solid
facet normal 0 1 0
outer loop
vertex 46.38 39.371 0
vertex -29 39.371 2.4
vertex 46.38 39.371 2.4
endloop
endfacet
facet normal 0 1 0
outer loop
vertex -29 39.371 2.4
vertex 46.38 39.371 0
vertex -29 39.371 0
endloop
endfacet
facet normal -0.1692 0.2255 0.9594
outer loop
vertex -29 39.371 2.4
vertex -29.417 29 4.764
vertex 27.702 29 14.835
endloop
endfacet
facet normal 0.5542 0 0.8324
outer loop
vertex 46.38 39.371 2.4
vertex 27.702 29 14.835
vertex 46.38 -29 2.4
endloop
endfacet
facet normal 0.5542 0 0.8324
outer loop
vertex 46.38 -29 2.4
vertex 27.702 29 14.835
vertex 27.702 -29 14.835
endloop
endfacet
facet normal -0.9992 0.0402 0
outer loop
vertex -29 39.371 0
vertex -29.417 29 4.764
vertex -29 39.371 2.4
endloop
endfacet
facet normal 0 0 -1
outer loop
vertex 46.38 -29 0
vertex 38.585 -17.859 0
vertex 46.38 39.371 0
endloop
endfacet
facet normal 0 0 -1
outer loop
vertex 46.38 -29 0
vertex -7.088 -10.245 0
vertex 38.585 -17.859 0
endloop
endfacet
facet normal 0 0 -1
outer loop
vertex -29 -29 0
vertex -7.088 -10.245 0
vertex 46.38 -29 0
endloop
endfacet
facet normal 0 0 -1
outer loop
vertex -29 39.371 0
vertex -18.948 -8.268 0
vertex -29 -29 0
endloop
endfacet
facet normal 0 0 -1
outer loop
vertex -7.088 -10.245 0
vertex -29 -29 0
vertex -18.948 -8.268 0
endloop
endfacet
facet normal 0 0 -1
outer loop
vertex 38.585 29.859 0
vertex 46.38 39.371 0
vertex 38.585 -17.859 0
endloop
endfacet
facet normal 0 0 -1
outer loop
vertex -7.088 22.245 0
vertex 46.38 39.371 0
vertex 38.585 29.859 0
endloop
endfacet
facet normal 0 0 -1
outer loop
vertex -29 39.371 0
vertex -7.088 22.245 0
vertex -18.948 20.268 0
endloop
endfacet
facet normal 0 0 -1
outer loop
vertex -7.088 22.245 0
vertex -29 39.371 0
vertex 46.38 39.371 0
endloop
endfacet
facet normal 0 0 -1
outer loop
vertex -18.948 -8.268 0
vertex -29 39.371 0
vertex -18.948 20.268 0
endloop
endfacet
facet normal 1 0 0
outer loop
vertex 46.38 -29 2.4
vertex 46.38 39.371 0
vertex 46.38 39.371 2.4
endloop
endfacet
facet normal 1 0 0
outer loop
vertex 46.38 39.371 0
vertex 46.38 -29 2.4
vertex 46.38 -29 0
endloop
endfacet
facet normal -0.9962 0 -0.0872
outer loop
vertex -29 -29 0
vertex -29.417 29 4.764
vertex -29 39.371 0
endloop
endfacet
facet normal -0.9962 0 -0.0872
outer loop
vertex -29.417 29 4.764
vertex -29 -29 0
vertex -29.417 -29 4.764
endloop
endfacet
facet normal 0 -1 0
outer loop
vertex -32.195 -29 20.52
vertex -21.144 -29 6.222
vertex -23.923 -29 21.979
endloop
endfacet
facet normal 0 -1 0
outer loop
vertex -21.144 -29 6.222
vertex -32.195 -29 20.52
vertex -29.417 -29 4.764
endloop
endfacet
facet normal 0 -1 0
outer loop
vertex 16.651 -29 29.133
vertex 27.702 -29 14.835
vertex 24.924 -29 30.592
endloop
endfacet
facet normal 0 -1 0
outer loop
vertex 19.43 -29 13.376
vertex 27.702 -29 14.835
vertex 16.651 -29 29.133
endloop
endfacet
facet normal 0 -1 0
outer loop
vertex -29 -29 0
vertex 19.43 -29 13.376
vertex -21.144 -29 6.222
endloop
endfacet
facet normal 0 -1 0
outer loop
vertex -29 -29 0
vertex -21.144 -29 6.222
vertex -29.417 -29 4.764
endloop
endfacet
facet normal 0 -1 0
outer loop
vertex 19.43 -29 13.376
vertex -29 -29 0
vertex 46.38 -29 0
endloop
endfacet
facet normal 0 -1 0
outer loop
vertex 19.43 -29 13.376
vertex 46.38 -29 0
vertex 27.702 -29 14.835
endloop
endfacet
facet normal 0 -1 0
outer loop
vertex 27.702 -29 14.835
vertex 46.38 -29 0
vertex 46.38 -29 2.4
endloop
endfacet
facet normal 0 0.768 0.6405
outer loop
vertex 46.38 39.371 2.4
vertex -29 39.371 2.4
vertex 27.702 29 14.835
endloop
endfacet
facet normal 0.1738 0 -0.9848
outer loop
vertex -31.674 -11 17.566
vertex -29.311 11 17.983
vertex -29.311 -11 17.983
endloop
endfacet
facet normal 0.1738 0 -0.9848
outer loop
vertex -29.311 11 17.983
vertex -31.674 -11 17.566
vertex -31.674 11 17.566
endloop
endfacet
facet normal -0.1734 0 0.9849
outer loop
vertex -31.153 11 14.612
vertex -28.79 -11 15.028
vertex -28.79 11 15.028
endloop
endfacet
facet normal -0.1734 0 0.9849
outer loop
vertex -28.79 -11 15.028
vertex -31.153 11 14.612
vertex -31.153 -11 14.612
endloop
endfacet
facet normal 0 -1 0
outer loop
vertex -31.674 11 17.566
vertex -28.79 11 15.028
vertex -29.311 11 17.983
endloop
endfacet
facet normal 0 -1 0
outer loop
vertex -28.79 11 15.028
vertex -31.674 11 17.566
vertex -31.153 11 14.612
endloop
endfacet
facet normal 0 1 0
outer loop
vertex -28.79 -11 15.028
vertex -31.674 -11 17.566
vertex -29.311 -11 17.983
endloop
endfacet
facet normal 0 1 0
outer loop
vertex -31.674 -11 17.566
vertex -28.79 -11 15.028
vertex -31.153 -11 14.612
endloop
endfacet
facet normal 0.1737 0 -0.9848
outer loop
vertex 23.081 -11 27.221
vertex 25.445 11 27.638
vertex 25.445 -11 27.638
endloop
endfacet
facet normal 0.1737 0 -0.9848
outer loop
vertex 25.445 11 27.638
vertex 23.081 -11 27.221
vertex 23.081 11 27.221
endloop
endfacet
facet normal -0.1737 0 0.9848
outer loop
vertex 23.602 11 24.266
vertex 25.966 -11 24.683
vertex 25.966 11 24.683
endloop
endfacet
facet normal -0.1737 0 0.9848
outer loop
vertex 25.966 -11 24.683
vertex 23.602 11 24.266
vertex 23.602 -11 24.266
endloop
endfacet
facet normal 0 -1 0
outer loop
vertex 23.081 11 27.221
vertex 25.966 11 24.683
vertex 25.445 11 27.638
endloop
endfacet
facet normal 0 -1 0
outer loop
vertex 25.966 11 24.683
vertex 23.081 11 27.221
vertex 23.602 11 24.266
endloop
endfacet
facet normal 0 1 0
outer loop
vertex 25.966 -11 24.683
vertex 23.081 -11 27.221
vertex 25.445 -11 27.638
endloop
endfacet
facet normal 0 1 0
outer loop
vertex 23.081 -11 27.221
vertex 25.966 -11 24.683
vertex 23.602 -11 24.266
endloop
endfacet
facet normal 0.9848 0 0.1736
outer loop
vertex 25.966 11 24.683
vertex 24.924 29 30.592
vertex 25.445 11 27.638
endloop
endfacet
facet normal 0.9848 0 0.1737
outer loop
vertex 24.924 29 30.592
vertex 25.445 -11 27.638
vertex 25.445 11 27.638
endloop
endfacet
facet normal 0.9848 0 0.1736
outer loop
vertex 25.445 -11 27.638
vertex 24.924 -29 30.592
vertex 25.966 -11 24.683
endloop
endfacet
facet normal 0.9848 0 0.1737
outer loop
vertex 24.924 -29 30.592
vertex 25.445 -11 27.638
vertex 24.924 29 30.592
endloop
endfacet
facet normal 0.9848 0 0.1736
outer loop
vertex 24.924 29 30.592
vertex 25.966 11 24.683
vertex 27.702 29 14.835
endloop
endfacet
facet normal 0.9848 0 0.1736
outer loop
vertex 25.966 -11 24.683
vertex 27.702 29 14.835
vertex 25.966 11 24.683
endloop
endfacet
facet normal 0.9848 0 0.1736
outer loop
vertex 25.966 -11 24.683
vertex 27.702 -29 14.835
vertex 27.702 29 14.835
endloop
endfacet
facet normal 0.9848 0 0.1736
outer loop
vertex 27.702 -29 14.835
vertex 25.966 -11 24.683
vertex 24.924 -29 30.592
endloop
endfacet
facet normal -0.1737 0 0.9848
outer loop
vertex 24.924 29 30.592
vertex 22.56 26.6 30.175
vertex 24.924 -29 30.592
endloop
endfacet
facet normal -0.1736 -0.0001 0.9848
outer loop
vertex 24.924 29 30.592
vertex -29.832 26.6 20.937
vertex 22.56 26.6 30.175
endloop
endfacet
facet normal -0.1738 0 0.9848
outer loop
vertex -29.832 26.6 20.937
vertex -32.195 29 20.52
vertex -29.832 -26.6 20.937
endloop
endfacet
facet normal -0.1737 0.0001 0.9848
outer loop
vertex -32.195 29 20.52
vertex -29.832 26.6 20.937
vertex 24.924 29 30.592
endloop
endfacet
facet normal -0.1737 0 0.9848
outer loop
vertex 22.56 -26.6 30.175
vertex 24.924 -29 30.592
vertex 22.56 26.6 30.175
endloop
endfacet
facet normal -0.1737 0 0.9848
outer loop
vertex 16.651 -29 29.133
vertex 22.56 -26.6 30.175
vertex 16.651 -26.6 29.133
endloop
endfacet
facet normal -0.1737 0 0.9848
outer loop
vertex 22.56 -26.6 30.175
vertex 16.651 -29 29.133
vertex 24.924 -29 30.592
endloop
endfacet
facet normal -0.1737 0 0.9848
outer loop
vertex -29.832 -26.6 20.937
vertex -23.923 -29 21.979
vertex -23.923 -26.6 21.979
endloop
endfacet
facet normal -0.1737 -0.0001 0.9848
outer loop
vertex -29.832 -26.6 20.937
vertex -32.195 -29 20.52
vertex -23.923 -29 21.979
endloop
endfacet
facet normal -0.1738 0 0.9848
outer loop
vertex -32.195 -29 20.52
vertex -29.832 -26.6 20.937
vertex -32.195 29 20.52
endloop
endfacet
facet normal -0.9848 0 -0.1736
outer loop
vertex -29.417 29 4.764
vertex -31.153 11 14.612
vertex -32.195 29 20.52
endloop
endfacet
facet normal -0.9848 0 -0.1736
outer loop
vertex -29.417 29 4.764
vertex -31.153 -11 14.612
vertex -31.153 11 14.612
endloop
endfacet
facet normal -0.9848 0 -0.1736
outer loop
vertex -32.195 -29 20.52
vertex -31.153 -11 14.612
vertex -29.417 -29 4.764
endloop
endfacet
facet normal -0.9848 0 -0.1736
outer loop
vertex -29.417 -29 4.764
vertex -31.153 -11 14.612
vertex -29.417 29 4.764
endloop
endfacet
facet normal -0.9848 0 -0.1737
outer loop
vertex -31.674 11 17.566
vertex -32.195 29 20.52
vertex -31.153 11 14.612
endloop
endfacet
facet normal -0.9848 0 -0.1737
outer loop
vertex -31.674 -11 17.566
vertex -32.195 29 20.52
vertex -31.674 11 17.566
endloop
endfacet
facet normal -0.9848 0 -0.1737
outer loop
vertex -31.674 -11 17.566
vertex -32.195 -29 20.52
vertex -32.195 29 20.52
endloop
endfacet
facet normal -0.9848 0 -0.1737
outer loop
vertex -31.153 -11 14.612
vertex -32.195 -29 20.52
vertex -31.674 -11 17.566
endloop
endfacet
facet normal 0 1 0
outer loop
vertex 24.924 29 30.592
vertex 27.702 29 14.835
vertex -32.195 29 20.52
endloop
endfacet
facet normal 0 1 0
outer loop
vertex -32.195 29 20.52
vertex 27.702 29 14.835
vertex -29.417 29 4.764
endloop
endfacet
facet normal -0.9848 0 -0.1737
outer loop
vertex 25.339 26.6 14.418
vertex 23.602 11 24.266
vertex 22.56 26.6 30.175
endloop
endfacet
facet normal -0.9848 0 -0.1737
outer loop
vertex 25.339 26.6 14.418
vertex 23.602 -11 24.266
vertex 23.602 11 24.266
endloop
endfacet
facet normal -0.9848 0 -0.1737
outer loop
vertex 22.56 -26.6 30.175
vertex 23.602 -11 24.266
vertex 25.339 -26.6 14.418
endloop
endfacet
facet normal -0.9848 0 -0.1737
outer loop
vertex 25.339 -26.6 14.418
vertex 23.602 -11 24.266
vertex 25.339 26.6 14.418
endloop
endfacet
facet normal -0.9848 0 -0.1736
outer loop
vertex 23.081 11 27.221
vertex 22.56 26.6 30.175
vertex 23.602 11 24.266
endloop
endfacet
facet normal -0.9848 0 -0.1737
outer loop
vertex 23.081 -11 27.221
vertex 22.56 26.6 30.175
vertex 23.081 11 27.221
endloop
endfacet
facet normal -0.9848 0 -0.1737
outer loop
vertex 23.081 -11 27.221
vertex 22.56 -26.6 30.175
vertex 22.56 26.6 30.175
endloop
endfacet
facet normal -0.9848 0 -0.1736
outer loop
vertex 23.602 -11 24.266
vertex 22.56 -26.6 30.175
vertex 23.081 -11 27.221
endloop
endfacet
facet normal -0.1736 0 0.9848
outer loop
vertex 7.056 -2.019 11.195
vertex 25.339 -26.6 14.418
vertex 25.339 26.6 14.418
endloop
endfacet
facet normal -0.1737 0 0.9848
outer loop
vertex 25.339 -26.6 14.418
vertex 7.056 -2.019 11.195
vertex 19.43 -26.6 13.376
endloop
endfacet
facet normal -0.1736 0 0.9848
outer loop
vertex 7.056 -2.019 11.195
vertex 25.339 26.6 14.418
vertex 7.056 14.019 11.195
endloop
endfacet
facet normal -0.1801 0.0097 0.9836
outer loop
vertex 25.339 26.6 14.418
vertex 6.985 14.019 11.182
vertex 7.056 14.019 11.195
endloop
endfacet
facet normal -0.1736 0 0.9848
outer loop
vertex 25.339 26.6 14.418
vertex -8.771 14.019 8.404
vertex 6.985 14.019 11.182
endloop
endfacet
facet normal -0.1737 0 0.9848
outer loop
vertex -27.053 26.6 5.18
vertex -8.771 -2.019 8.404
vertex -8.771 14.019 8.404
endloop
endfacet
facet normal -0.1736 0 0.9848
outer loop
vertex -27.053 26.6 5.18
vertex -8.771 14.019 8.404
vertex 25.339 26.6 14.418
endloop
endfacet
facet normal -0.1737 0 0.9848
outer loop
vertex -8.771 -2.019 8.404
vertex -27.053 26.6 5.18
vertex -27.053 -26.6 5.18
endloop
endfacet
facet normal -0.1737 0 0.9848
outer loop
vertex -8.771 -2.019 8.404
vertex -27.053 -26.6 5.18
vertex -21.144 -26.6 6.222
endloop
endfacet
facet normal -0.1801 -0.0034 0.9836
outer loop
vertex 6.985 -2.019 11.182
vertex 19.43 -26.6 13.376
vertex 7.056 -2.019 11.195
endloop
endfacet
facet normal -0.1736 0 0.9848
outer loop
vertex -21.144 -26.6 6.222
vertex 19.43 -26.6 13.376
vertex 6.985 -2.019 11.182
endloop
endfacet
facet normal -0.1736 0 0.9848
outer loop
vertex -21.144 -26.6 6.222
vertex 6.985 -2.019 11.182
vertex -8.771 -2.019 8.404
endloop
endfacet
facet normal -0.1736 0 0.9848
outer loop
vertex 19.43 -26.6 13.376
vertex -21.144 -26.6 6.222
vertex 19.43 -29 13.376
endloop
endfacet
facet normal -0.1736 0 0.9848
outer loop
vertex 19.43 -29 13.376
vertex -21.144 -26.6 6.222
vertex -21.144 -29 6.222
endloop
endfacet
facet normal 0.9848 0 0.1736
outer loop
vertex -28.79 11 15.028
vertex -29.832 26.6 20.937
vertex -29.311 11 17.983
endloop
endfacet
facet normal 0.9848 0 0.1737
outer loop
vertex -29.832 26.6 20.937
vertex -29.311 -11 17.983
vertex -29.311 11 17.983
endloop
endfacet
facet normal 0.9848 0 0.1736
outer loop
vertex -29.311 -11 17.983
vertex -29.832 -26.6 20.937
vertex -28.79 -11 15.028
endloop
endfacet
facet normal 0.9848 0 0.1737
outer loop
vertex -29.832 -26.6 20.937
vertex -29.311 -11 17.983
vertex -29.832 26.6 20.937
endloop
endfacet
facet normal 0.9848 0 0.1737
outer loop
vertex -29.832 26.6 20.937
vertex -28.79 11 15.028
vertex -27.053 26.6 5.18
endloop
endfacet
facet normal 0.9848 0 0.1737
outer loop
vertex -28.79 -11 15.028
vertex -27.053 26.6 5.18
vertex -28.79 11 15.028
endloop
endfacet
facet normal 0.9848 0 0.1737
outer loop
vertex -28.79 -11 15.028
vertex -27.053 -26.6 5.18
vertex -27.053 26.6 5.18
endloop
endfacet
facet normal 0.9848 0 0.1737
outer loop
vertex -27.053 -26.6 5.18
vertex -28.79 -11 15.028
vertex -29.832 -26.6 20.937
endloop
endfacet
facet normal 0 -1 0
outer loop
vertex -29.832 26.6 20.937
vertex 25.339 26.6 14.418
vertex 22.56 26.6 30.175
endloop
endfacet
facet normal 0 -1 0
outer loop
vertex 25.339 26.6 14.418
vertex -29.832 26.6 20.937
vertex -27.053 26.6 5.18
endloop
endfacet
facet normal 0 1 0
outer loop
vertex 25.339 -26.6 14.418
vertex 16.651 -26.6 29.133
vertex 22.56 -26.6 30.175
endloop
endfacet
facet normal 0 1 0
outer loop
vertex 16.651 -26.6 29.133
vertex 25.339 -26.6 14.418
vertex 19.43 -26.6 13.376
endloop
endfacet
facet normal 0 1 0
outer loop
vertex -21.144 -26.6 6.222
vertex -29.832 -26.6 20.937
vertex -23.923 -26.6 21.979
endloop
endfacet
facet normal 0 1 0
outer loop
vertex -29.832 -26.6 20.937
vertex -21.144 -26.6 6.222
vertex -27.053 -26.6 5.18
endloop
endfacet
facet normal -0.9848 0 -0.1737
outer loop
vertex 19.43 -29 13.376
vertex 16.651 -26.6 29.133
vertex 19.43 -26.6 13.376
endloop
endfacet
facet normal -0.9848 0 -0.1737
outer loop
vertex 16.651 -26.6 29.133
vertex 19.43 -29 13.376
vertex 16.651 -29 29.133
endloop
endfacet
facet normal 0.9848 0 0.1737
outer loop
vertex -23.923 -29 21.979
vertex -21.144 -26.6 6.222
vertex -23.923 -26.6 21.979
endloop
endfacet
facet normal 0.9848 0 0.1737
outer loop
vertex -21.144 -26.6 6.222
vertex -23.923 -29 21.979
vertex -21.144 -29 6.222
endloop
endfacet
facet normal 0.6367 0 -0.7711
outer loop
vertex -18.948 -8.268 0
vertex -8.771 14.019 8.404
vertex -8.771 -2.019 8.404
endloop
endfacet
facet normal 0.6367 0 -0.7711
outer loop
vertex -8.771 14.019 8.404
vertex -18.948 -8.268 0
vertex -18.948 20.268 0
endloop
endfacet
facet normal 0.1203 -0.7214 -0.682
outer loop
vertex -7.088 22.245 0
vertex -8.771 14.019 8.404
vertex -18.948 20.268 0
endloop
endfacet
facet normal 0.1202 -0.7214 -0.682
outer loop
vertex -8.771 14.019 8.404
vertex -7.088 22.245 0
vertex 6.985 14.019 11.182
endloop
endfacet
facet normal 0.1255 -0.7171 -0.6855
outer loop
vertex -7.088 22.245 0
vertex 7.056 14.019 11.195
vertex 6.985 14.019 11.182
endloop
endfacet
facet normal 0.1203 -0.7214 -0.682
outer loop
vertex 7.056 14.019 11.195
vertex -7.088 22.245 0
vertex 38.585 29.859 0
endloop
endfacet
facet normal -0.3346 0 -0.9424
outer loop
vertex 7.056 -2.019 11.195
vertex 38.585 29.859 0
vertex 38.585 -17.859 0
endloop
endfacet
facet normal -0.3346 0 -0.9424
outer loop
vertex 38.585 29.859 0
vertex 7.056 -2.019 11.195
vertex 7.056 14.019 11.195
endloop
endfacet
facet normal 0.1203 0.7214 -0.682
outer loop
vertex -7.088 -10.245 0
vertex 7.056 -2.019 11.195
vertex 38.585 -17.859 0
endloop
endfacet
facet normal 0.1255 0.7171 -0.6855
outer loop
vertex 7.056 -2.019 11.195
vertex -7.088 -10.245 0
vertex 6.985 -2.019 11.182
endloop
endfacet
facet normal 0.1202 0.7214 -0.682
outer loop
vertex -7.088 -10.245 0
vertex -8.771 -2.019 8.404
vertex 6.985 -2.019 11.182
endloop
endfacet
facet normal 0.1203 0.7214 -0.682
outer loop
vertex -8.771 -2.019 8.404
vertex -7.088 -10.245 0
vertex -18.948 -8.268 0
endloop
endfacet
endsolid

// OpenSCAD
// Window wedge mount for Sunrise/Sunset cameras (Thingino Wyze/Sonoff and similar).
//
// Sticks to the inside of a window with VHB tape. A light-tight hood turns the
// camera a fixed number of degrees left or right of the window's facing, so it
// looks at the equinox sunset (or sunrise) instead of straight out. The setup app
// (/setup/<claim code>) measures the window and tells you which wedge to print:
// 0, 5, 10, 15 or 20 degrees, and which end is tall (north or south).
//
// The hood also seals the camera against the glass, which blocks reflections of
// the room in the window at dusk.
//
// Units: mm. Render: openscad -o mount.stl -D 'wedge_deg=10' -D 'tall_end="right"' window-wedge-mount.scad
//
// CAMERA DIMENSIONS ARE ESTIMATES. Measure your camera's front face and lens
// position with calipers before printing and override the camera_* values.

/* [Wedge (from the setup app)] */
wedge_deg = 10;          // [0:5:20]
// Which end is thick, seen from inside the room looking out the window.
// Facing west, north is on your right; facing east, north is on your left.
tall_end = "right";      // [left, right]

/* [Camera] */
camera = "wyze_v3";      // [wyze_v3, sonoff_s2, custom]
// Used only when camera = "custom":
custom_face_w = 52;      // front face width
custom_face_h = 52;      // front face height
custom_lens_dx = 0;      // lens offset from face centre, + = right (seen from the room)
custom_lens_dy = 6;      // lens offset from face centre, + = up
custom_hfov = 114;       // horizontal field of view, degrees
custom_vfov = 82;        // vertical field of view, degrees

/* [Fit] */
clearance = 0.6;         // pocket clearance per side
wall = 2.4;              // cradle wall thickness
cradle_depth = 16;       // how far the cradle wraps the camera's front
open_bottom = true;      // leave the cradle's bottom open for a stand or cable
plate_t = 2.4;           // plate the camera face rests on
base_t = 2.4;            // flange that sticks to the glass
border = 8;              // VHB margin around the view opening
fov_margin = 4;          // extra degrees on the view cone so the hood never vignettes
strap_slot = [3, 22];    // slots in the side walls for a hook-and-loop strap
lens_window = 16;        // opening at the camera face: lens barrel plus IR/light sensor margin

// ---- camera presets (approximate; measure!) ----
// Wyze Cam v3: ~51 x 51 mm face; FOV 130 deg diagonal, ~114 H x ~82 V (estimated).
// Sonoff CAM-S2: face size unverified; FOV "100 deg" (likely diagonal), ~88 H x ~55 V.
function preset(name) =
    name == "wyze_v3"   ? [52, 52, 0, 6, 114, 82] :
    name == "sonoff_s2" ? [46, 46, 0, 4, 88, 55] :
                          [custom_face_w, custom_face_h, custom_lens_dx, custom_lens_dy, custom_hfov, custom_vfov];

P = preset(camera);
face_w = P[0]; face_h = P[1];
lens_dx = P[2]; lens_dy = P[3];
hfov = P[4]; vfov = P[5];

pocket_w = face_w + 2 * clearance;
pocket_h = face_h + 2 * clearance;
outer_w = pocket_w + 2 * wall;
outer_h = pocket_h + 2 * wall;

// Geometry is built with the tall end on the right (+x) and mirrored if needed.
// Glass is the plane z = 0; the room is +z. The camera plate is hinged at its
// left (thin) edge and rotated by wedge_deg about the vertical (y) axis, so the
// camera's optical axis points out through the glass, turned toward the TALL end
// (the camera's far edge sits further from the glass, so it faces that way).
hinge_x = -outer_w / 2;

module camera_frame() {
    translate([hinge_x, 0, base_t])
        rotate([0, -wedge_deg, 0])
            translate([-hinge_x, 0, 0])
                children();
}

// View cone: a pyramid from the lens out through the glass, sized to the FOV.
module view_cone() {
    L = 200;
    hw = L * tan(min(hfov / 2 + fov_margin, 80));
    hh = L * tan(min(vfov / 2 + fov_margin, 80));
    camera_frame()
        translate([lens_dx, lens_dy, plate_t + 0.01])
            hull() {
                cube([lens_window, lens_window, 0.02], center = true);
                translate([0, 0, -L]) cube([2 * hw, 2 * hh, 0.02], center = true);
            }
}

// Footprint of the view cone on the glass, to size the flange. The camera is
// turned toward the tall end, so the opening on the glass is lopsided: it reaches
// much further on that side. Wide cameras at big wedges would need a huge flange,
// so each side is capped at max_reach; past that, the hood is open on that side
// (some room light can reach the glass there).
max_reach = 60;           // mm from the lens to the flange edge, per side
hh_deg = min(hfov / 2 + fov_margin, 80);
vh_deg = min(vfov / 2 + fov_margin, 80);
lens_rx = lens_dx - hinge_x;                       // lens x measured from the hinge, camera frame
lens_wx = hinge_x + lens_rx * cos(wedge_deg) - plate_t * sin(wedge_deg);
lens_wz = base_t + lens_rx * sin(wedge_deg) + plate_t * cos(wedge_deg);
// Where the view cone's corner and edge rays meet the glass (z = 0), as offsets
// from the lens. A ray that runs nearly parallel to the glass (the tall side of a
// wide camera at a big wedge) is capped at max_reach and left out of the
// vertical sizing, so it can't blow the flange up to a huge height.
function hit_raw(sx, sy) =
    let (dx = sx * tan(hh_deg), dy = sy * tan(vh_deg),
         wx = dx * cos(wedge_deg) + sin(wedge_deg),
         wz = dx * sin(wedge_deg) - cos(wedge_deg),
         t = wz < -0.01 ? lens_wz / -wz : 1e4)
    [t * wx, t * dy];
function capped(h) = abs(h[0]) > max_reach;
function clampv(v) = max(-max_reach, min(max_reach, v));
H = [for (sx = [-1, 0, 1], sy = [-1, 1]) hit_raw(sx, sy)];
Hv = [for (h = H) if (!capped(h)) h];
// The lens window's far edge sits higher off the glass on the tall side.
tall_extra = lens_window * sin(wedge_deg);
foot_x0 = clampv(min([for (h = H) h[0]])) - lens_window / 2;
foot_x1 = clampv(max([for (h = H) h[0]])) + lens_window / 2 + tall_extra;
foot_y0 = clampv(min([for (h = Hv) h[1]])) - lens_window / 2 - tall_extra;
foot_y1 = clampv(max([for (h = Hv) h[1]])) + lens_window / 2 + tall_extra;
lens_wy = lens_dy;
flange_x0 = min(-outer_w / 2, lens_wx + max(foot_x0 - border, -max_reach));
flange_x1 = max(hinge_x + outer_w * cos(wedge_deg), lens_wx + min(foot_x1 + border, max_reach));
flange_y0 = min(-outer_h / 2, lens_wy + max(foot_y0 - border, -max_reach));
flange_y1 = max(outer_h / 2, lens_wy + min(foot_y1 + border, max_reach));

module flange() {
    translate([flange_x0, flange_y0, 0]) cube([flange_x1 - flange_x0, flange_y1 - flange_y0, base_t]);
}

module camera_plate() {
    camera_frame() translate([-outer_w / 2, -outer_h / 2, 0]) cube([outer_w, outer_h, plate_t]);
}

module cradle() {
    camera_frame() translate([0, 0, plate_t - 0.5]) difference() {
        translate([-outer_w / 2, -outer_h / 2, 0]) cube([outer_w, outer_h, cradle_depth + 0.5]);
        // pocket starts at the plate's top face (cradle is sunk 0.5 into the plate for a clean union)
        translate([-pocket_w / 2, -pocket_h / 2, 0.5]) cube([pocket_w, pocket_h, cradle_depth + 2]);
        if (open_bottom)
            translate([-pocket_w / 2 + 6, -outer_h / 2 - 1, 0.5])
                cube([pocket_w - 12, wall + 2, cradle_depth + 2]);
        // strap slots through both side walls
        for (s = [-1, 1])
            translate([s * (outer_w / 2 - wall / 2) - (wall + 2) / 2, -strap_slot[1] / 2, cradle_depth - strap_slot[0] - 2.5])
                cube([wall + 2, strap_slot[1], strap_slot[0]]);
    }
}

module mount() {
    difference() {
        union() {
            // solid wedge between the flange and the camera plate, trimmed so it
            // never rises above the plate the camera face rests on
            intersection() {
                hull() { flange(); camera_plate(); }
                camera_frame() translate([-500, -500, -1000]) cube([1000, 1000, 1000 + plate_t]);
            }
            cradle();
        }
        view_cone();
    }
}

if (tall_end == "right") mount();
else mirror([1, 0, 0]) mount();
